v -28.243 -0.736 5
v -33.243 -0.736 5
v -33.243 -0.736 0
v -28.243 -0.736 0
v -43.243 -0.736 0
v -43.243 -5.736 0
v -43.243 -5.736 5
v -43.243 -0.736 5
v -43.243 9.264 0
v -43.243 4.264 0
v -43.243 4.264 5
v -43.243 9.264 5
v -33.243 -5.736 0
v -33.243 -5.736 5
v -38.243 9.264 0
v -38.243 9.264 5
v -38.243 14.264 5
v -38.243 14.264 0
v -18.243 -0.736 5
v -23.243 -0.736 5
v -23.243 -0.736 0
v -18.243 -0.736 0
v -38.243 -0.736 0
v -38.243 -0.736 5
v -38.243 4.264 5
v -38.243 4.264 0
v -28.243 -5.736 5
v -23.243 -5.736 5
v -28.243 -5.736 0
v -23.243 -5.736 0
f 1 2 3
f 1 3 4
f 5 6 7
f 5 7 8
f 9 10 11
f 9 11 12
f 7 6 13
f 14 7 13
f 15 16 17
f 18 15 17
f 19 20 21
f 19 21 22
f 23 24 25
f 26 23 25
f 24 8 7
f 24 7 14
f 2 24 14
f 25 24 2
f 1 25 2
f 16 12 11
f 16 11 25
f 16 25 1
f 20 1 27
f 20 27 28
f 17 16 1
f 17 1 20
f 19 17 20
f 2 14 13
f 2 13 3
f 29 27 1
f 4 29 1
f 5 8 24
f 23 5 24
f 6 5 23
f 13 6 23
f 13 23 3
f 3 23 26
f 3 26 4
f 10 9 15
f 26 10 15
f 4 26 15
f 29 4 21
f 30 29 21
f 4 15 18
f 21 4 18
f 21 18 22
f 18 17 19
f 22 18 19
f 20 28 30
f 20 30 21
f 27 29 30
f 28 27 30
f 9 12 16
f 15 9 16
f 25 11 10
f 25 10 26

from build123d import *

# Parameters (mm, degrees)
ESQUISSE1_W             = 25
ESQUISSE1_H             = 20
BOSS_EXTRU_1_DEPTH      = 5
ESQUISSE2_W             = 5
ESQUISSE2_H             = 5
ENL_V_MAT_EXTRU_4_DEPTH = 5


with BuildPart() as part:
    # Esquisse1 → Boss.-Extru.1 (new body)
    with BuildSketch(Plane.XY):
        with Locations((-30.743041797, 4.26352657)):
            Rectangle(ESQUISSE1_W, ESQUISSE1_H)
    extrude(amount=BOSS_EXTRU_1_DEPTH)

    # Esquisse2 → Enlèv. mat.-Extru.4 (cut)
    with BuildSketch(Plane.XY.offset(5)):
        Polygon((-38.243041797, 14.26352657), (-18.243041797, -0.73647343), (-18.243041797, 14.26352657), align=None)
        with Locations((-40.743041797, 11.76352657)):
            Rectangle(ESQUISSE2_W, ESQUISSE2_H)
        with Locations((-40.743041797, 1.76352657)):
            Rectangle(ESQUISSE2_W, ESQUISSE2_H)
        with Locations((-30.743041797, -3.23647343)):
            Rectangle(ESQUISSE2_W, ESQUISSE2_H)
        with Locations((-20.743041797, -3.23647343)):
            Rectangle(ESQUISSE2_W, ESQUISSE2_H)
    extrude(amount=-ENL_V_MAT_EXTRU_4_DEPTH, mode=Mode.SUBTRACT)


solid = part.part
